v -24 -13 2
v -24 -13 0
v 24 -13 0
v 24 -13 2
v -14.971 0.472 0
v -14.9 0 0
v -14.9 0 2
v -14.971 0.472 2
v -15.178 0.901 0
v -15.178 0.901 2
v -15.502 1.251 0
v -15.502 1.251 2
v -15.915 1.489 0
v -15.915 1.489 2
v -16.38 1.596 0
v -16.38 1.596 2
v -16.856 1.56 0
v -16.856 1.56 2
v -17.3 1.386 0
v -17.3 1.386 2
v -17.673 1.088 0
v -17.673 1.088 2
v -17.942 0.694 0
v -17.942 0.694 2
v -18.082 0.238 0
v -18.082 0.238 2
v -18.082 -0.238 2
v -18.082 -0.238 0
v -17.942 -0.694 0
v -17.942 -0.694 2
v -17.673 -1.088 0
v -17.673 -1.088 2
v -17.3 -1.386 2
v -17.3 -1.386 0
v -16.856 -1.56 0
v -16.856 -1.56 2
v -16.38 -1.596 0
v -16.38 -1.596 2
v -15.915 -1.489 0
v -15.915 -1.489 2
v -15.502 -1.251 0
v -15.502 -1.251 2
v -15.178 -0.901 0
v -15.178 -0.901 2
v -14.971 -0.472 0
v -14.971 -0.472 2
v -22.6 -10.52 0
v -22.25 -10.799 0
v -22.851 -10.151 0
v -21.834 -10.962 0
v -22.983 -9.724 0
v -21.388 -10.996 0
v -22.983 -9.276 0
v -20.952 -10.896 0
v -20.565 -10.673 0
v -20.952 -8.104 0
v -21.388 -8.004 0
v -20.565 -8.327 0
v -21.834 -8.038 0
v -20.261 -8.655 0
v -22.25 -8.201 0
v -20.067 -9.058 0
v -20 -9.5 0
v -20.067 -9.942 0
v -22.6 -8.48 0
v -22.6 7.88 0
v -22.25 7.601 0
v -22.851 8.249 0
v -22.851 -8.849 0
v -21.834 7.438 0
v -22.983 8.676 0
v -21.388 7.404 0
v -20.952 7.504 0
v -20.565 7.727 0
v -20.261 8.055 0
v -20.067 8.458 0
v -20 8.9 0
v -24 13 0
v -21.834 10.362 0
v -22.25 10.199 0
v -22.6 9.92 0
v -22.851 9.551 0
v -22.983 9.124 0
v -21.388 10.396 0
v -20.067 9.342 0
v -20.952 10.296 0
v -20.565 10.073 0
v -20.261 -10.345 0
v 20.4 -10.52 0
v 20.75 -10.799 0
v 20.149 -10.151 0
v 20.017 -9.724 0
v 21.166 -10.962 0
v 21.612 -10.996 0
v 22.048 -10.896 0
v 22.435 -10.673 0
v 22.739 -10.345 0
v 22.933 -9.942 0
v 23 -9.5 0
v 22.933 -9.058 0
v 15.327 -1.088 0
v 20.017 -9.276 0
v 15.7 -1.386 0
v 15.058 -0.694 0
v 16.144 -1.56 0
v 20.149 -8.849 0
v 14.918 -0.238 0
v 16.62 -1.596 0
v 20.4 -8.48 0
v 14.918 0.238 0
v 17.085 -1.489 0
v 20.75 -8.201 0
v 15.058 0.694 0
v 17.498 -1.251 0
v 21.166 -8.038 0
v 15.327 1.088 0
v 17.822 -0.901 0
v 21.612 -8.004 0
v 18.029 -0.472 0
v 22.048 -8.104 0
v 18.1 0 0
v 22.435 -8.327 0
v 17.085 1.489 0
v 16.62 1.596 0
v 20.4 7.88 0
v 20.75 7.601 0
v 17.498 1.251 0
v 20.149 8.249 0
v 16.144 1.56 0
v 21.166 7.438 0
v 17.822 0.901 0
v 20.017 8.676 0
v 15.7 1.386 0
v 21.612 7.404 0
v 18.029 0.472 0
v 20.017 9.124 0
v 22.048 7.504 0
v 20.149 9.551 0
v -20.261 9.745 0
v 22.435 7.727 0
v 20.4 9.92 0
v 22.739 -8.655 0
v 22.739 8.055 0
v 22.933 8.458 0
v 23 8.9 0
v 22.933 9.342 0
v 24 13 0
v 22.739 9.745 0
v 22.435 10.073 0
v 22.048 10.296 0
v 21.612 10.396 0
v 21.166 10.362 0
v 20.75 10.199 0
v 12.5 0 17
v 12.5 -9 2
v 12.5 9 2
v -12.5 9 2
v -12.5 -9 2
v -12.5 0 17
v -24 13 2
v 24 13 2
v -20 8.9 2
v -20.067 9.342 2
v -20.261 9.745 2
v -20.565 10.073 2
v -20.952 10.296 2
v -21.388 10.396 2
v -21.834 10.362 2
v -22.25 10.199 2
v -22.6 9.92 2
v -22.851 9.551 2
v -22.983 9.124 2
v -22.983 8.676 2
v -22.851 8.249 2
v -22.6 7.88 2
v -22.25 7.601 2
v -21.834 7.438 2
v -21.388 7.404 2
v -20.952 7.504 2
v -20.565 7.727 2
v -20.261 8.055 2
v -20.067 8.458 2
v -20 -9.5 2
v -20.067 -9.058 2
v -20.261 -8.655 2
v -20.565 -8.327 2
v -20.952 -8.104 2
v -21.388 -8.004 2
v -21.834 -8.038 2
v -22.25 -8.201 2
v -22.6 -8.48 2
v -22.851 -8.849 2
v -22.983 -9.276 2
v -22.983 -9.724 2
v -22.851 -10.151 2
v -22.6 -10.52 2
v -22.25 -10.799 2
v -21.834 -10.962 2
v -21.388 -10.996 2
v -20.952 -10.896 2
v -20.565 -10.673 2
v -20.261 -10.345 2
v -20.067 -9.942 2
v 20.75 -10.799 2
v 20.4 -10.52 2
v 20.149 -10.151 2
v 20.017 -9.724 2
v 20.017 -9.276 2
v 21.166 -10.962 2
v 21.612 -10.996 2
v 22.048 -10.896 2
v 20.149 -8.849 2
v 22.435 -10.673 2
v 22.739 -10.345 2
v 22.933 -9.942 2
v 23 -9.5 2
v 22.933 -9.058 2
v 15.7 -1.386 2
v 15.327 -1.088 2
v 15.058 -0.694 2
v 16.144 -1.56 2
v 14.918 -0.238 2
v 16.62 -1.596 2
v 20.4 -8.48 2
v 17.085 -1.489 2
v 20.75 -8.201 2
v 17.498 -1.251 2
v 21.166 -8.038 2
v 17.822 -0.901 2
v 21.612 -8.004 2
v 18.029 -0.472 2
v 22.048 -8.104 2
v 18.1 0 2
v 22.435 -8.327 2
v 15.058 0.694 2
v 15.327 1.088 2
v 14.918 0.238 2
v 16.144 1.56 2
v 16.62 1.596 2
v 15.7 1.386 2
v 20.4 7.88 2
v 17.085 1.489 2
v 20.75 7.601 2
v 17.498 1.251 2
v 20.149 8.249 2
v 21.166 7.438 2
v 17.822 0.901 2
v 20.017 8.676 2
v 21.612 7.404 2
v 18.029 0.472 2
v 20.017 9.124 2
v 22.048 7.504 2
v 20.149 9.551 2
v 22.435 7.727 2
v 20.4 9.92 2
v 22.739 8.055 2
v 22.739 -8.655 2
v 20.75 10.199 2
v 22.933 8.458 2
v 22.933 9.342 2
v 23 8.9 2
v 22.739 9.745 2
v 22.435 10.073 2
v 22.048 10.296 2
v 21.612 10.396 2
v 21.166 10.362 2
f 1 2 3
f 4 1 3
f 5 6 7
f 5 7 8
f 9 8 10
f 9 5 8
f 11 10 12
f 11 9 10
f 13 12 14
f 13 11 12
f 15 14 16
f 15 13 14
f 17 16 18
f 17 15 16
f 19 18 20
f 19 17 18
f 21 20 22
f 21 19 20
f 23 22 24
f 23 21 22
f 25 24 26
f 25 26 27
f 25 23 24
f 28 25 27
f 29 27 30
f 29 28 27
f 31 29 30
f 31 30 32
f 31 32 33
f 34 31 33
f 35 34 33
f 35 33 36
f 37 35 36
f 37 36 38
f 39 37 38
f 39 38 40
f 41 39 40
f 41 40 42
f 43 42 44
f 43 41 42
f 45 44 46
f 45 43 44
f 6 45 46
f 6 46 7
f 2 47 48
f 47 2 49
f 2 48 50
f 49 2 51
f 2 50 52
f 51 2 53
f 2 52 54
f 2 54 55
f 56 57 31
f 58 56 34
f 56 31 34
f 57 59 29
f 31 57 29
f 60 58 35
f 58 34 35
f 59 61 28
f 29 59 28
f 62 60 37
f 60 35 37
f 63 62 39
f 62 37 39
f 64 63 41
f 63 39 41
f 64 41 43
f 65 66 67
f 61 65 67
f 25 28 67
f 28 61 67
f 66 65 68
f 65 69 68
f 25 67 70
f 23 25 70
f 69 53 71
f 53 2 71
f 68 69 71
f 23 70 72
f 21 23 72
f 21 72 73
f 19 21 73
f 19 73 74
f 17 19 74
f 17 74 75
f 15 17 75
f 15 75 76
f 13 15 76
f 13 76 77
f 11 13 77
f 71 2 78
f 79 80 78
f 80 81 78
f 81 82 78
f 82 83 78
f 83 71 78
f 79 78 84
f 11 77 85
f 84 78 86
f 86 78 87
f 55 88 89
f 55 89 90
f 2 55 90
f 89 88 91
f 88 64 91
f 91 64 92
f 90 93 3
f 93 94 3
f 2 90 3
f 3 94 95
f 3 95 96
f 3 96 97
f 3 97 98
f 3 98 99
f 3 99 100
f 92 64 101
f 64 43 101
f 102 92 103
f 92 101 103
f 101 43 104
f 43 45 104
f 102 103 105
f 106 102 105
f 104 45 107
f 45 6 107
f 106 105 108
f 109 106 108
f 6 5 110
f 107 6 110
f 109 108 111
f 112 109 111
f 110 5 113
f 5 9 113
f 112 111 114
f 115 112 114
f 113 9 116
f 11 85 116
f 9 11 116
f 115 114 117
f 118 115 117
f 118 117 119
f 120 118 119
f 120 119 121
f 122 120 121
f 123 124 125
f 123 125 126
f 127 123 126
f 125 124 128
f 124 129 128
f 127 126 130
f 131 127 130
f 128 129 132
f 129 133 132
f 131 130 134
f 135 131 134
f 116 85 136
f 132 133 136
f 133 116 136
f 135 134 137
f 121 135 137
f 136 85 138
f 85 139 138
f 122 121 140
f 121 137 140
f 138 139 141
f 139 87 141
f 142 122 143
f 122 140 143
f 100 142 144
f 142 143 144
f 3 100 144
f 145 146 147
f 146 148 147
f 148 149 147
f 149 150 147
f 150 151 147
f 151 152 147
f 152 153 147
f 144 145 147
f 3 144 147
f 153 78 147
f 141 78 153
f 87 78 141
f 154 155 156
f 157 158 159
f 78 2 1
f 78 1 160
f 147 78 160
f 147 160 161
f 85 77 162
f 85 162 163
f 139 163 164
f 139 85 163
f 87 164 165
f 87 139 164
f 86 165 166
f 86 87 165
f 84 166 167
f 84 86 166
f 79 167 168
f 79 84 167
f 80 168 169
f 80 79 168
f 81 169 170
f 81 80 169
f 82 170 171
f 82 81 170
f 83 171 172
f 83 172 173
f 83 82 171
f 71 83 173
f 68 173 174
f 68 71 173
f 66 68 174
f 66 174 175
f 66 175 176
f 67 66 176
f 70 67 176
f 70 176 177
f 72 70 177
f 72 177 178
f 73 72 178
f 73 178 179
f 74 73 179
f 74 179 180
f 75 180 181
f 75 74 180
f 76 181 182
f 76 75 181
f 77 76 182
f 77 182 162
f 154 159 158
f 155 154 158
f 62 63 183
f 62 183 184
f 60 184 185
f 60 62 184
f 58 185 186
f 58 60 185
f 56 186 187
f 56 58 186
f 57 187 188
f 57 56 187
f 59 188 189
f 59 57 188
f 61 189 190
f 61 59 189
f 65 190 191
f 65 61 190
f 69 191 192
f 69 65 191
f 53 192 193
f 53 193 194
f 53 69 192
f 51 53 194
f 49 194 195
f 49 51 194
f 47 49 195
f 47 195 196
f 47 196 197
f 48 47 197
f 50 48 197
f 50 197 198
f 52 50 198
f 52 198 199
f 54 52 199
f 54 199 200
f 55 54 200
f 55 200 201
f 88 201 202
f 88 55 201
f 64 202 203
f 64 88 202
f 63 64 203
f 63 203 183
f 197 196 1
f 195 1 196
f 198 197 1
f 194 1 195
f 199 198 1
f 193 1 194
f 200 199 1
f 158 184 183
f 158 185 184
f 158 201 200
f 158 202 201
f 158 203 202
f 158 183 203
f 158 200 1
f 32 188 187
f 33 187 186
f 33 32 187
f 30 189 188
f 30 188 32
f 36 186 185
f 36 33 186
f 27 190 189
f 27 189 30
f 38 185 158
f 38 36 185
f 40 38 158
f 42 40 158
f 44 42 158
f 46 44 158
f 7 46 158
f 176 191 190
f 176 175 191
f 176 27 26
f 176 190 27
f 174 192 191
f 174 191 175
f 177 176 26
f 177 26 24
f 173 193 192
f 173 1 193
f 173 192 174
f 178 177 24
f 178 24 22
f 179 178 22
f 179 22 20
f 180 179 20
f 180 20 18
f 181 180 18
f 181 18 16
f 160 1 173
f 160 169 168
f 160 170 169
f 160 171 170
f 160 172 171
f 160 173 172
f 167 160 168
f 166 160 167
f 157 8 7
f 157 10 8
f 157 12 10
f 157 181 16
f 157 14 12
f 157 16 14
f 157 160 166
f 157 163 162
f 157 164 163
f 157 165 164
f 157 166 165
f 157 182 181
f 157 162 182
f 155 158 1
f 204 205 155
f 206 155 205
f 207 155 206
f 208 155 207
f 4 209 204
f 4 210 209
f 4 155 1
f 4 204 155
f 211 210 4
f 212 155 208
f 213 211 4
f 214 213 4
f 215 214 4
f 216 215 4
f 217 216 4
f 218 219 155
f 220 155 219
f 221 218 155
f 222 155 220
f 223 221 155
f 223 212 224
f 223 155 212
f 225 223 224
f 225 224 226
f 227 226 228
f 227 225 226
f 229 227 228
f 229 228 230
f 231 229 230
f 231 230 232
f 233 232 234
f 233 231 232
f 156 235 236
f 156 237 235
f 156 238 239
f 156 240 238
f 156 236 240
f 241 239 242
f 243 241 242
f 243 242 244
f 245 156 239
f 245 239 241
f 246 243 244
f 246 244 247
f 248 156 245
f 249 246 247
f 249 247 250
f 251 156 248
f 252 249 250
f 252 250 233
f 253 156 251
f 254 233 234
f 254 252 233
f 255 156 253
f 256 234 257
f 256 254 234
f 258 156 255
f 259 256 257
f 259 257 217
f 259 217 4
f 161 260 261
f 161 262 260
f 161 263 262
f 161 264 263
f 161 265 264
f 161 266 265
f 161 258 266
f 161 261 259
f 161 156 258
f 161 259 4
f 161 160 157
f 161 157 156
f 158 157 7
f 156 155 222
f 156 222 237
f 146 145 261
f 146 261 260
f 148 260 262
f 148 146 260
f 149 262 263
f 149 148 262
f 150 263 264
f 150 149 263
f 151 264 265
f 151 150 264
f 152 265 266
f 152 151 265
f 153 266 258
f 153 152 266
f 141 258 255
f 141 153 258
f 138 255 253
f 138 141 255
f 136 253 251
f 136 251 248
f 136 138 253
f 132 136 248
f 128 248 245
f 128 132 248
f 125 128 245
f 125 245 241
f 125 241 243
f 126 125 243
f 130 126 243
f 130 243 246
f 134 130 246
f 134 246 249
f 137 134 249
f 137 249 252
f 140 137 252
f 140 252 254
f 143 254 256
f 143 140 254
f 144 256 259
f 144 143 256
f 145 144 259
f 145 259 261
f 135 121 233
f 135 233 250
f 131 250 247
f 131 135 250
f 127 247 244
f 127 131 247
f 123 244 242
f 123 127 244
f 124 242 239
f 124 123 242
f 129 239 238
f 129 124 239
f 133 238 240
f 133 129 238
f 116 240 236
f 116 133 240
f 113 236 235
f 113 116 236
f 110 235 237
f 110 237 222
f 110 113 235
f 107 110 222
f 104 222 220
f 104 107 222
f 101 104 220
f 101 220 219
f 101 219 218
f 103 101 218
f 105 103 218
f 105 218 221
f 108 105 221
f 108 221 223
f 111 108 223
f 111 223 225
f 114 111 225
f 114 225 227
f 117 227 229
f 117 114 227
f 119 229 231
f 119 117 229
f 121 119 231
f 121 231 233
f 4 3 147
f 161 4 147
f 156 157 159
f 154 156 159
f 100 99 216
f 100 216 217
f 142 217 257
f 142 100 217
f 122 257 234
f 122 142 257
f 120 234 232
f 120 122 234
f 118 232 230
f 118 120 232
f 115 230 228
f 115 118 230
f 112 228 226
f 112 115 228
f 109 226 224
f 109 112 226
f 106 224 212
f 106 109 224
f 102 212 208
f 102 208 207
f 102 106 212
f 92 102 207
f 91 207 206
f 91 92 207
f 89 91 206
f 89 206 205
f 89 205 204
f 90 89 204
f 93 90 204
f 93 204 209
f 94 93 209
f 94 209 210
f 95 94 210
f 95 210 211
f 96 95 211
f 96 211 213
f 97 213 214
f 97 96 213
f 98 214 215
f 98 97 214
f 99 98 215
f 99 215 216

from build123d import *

# Parameters (mm, degrees)
F0_W     = 48
F0_H     = 26
F0_R     = 1.5
F0_R_2   = 1.6
F1_DEPTH = 2
F2_W     = 25
F2_H     = 18
F3_DEPTH = 15
F5_DEPTH = 25


with BuildPart() as f1:
    # F0 (on Top) → F1 (new body)
    with BuildSketch(Plane.XY):
        Rectangle(F0_W, F0_H)
        with Locations((-21.5, -9.5)):
            Circle(F0_R, mode=Mode.SUBTRACT)
        with Locations((21.5, -9.5)):
            Circle(F0_R, mode=Mode.SUBTRACT)
        with Locations((-16.5, 0)):
            Circle(F0_R_2, mode=Mode.SUBTRACT)
        with Locations((-21.5, 8.9)):
            Circle(F0_R, mode=Mode.SUBTRACT)
        with Locations((16.5, 0)):
            Circle(F0_R_2, mode=Mode.SUBTRACT)
        with Locations((21.5, 8.9)):
            Circle(F0_R, mode=Mode.SUBTRACT)
    extrude(amount=F1_DEPTH)

    # F2 (on face) → F3 (join)
    with BuildSketch(Plane.XY.offset(2)):
        Rectangle(F2_W, F2_H)
    extrude(amount=F3_DEPTH)

    # F4 (on face) → F5 (cut)
    with BuildSketch(Plane(origin=(-12.5, 0, 0), x_dir=(0, -1, 0), z_dir=(-1, 0, 0))):
        Polygon((-9, 17), (-9, 2), (0, 17), align=None)
        Polygon((9, 17), (0, 17), (9, 2), align=None)
    extrude(amount=-F5_DEPTH, mode=Mode.SUBTRACT)


solid = f1.part
